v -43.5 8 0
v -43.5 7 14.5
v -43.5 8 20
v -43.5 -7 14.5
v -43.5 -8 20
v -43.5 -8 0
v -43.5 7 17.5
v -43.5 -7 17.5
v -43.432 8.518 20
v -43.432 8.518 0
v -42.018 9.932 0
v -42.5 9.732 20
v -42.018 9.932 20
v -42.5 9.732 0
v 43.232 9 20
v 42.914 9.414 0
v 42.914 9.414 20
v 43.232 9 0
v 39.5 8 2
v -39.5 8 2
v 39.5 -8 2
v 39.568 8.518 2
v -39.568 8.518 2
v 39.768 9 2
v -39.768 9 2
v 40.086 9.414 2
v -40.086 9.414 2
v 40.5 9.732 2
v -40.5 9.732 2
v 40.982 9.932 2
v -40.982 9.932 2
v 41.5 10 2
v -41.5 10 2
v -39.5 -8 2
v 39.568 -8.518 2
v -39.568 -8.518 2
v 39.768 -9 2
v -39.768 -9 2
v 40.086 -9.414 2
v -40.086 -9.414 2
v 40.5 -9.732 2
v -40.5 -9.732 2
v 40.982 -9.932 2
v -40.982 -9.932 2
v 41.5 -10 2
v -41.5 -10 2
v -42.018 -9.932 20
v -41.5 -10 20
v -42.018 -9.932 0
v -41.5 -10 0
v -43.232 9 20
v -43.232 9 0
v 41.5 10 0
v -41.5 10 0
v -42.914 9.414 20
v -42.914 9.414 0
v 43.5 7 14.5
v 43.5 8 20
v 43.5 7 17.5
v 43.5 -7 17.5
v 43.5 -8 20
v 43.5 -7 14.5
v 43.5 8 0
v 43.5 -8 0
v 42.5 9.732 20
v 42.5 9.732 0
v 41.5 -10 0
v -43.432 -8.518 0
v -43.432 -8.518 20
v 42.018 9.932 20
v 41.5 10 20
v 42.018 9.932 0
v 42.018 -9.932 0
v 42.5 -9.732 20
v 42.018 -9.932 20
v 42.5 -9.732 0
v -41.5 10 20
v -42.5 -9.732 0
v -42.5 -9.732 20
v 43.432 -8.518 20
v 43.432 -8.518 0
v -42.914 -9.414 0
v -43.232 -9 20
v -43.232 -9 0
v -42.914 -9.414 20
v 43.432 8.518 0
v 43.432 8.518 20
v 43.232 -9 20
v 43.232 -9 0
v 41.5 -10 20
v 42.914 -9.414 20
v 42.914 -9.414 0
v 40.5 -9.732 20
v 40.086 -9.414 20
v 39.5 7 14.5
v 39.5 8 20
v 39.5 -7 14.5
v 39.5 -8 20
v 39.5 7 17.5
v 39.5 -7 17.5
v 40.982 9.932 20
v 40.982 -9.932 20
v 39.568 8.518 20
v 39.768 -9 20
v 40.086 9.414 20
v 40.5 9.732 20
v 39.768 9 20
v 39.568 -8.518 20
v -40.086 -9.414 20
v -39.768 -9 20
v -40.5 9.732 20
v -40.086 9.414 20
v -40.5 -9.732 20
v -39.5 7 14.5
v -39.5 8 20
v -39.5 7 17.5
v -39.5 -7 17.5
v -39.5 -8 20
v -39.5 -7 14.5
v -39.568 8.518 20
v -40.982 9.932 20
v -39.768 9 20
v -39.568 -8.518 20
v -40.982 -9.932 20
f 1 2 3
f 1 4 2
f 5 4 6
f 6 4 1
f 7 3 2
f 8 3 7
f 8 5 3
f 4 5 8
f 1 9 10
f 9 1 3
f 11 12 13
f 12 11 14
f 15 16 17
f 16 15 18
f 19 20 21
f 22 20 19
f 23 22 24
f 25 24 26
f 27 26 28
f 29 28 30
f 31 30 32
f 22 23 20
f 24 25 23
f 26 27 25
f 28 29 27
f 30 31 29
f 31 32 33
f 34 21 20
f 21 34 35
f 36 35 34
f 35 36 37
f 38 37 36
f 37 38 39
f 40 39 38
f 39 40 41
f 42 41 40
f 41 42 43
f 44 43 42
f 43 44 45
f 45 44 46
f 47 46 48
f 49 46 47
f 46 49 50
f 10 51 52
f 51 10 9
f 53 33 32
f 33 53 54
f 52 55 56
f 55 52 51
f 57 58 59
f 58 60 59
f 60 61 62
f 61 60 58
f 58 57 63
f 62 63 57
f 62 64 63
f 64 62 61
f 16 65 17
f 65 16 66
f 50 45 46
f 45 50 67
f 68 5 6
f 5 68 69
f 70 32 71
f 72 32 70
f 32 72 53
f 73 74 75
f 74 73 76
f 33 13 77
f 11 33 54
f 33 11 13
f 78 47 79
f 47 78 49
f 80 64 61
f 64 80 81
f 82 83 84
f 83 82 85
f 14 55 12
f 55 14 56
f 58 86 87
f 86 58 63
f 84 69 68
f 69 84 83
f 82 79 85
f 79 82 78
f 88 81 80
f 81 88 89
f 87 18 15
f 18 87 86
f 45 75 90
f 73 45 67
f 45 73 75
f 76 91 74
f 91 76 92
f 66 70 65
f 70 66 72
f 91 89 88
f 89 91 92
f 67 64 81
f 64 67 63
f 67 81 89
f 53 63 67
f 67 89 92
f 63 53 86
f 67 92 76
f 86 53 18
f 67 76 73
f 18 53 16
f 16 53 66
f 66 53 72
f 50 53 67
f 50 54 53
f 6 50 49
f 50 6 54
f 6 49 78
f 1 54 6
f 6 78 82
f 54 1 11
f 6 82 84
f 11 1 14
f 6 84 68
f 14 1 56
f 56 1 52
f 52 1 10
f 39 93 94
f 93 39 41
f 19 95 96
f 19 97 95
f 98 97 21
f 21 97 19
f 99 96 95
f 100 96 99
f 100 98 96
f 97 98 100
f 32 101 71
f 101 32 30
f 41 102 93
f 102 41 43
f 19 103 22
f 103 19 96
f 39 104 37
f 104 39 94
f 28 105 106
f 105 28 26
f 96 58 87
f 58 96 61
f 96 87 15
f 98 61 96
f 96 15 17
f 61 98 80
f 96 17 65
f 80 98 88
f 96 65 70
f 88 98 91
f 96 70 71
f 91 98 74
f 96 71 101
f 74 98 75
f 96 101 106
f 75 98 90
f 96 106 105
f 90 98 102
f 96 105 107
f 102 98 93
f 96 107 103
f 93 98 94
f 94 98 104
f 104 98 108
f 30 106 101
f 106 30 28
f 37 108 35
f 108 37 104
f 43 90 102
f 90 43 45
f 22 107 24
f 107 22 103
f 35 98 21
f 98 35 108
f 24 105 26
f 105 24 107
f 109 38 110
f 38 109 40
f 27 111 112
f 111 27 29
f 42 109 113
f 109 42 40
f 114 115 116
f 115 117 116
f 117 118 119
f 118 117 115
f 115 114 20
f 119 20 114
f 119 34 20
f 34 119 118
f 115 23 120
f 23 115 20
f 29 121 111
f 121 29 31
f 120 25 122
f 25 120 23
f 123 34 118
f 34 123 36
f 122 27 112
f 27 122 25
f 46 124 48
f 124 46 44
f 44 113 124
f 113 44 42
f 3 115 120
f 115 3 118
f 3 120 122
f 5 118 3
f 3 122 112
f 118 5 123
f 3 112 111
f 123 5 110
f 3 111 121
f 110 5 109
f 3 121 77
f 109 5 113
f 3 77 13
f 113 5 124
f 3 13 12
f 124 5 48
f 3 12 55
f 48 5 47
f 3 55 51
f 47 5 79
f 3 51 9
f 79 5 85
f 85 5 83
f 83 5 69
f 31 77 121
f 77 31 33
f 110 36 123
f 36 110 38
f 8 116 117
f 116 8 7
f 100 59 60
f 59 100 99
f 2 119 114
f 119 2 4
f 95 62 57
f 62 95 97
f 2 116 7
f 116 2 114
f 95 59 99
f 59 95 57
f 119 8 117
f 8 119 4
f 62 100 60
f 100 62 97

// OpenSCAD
// file: ../OpenSCAD_Modules/cube_vround.scad
module cube_vround(
	size=[10,10,10],
	round_corners=[true,true,true,true],
	rounding=3,
	center_xy=false,
	center_z=false,
	attach=0,
	wall_attach=0,
	quality=2, //integer from 1 to infinity
)
{
	assert(len(size)==3);
	assert(len(round_corners)==4);
	assert(rounding>0);
	assert(rounding<=size[0]/2);
	assert(rounding<=size[1]/2);
	assert(quality>0);
	assert(attach>=0);
	assert(wall_attach>=0);
	height=size[2]+attach;
	cyl_r=rounding+wall_attach;
	cyl_mvx=size[0]/2-rounding;
	cyl_mvy=size[1]/2-rounding;
	cube_szx=size[0]/2;
	cube_szy=size[1]/2;
	cube_mvx=cube_szx/2+wall_attach;
	cube_mvy=cube_szy/2+wall_attach;
	translate([center_xy?0:cube_szx,center_xy?0:cube_szy,center_z?-attach/2:(size[2]-attach)/2])
		hull()
		{
			if(round_corners[0])
				translate([cyl_mvx,cyl_mvy])
					cylinder(r=cyl_r,h=height,$fn=12*quality,center=true);
			else
				translate([cube_mvx,cube_mvy])
					cube([cube_szx,cube_szy,height],center=true);
			if(round_corners[1])
				translate([cyl_mvx,-cyl_mvy])
					cylinder(r=cyl_r,h=height,$fn=12*quality,center=true);
			else
				translate([cube_mvx,-cube_mvy])
					cube([cube_szx,cube_szy,height],center=true);
			if(round_corners[2])
				translate([-cyl_mvx,-cyl_mvy])
					cylinder(r=cyl_r,h=height,$fn=12*quality,center=true);
			else
				translate([-cube_mvx,-cube_mvy])
					cube([cube_szx,cube_szy,height],center=true);
			if(round_corners[3])
				translate([-cyl_mvx,cyl_mvy])
					cylinder(r=cyl_r,h=height,$fn=12*quality,center=true);
			else
				translate([-cube_mvx,cube_mvy])
					cube([cube_szx,cube_szy,height],center=true);
		};
}

//example
cube_vround(round_corners=[true,false,true,false],
size=[10,20,6],
attach=0.1,
wall_attach=0.1,
rounding=3,
center_xy=true,center_z=false);
// main file
use <../OpenSCAD_Modules/cube_vround.scad>

module hdd_clip1(
	len=79,
	height=20,
	quality=2, //integer from 1 to infinity
)
{
	difference()
	{
		union()
		{
			cube_vround(size=[len+8,20,2],rounding=2,center_xy=true,quality=quality);
			translate([len/2+2,0,0])
				cube_vround(size=[4,20,height],rounding=2,center_xy=true,quality=quality);
			translate([-len/2-2,0,0])
				cube_vround(size=[4,20,height],rounding=2,center_xy=true,quality=quality);
		}
		translate([0,0,height-4])
			cube(size=[len+10,14,3],center=true);
	}
}

hdd_clip1();
